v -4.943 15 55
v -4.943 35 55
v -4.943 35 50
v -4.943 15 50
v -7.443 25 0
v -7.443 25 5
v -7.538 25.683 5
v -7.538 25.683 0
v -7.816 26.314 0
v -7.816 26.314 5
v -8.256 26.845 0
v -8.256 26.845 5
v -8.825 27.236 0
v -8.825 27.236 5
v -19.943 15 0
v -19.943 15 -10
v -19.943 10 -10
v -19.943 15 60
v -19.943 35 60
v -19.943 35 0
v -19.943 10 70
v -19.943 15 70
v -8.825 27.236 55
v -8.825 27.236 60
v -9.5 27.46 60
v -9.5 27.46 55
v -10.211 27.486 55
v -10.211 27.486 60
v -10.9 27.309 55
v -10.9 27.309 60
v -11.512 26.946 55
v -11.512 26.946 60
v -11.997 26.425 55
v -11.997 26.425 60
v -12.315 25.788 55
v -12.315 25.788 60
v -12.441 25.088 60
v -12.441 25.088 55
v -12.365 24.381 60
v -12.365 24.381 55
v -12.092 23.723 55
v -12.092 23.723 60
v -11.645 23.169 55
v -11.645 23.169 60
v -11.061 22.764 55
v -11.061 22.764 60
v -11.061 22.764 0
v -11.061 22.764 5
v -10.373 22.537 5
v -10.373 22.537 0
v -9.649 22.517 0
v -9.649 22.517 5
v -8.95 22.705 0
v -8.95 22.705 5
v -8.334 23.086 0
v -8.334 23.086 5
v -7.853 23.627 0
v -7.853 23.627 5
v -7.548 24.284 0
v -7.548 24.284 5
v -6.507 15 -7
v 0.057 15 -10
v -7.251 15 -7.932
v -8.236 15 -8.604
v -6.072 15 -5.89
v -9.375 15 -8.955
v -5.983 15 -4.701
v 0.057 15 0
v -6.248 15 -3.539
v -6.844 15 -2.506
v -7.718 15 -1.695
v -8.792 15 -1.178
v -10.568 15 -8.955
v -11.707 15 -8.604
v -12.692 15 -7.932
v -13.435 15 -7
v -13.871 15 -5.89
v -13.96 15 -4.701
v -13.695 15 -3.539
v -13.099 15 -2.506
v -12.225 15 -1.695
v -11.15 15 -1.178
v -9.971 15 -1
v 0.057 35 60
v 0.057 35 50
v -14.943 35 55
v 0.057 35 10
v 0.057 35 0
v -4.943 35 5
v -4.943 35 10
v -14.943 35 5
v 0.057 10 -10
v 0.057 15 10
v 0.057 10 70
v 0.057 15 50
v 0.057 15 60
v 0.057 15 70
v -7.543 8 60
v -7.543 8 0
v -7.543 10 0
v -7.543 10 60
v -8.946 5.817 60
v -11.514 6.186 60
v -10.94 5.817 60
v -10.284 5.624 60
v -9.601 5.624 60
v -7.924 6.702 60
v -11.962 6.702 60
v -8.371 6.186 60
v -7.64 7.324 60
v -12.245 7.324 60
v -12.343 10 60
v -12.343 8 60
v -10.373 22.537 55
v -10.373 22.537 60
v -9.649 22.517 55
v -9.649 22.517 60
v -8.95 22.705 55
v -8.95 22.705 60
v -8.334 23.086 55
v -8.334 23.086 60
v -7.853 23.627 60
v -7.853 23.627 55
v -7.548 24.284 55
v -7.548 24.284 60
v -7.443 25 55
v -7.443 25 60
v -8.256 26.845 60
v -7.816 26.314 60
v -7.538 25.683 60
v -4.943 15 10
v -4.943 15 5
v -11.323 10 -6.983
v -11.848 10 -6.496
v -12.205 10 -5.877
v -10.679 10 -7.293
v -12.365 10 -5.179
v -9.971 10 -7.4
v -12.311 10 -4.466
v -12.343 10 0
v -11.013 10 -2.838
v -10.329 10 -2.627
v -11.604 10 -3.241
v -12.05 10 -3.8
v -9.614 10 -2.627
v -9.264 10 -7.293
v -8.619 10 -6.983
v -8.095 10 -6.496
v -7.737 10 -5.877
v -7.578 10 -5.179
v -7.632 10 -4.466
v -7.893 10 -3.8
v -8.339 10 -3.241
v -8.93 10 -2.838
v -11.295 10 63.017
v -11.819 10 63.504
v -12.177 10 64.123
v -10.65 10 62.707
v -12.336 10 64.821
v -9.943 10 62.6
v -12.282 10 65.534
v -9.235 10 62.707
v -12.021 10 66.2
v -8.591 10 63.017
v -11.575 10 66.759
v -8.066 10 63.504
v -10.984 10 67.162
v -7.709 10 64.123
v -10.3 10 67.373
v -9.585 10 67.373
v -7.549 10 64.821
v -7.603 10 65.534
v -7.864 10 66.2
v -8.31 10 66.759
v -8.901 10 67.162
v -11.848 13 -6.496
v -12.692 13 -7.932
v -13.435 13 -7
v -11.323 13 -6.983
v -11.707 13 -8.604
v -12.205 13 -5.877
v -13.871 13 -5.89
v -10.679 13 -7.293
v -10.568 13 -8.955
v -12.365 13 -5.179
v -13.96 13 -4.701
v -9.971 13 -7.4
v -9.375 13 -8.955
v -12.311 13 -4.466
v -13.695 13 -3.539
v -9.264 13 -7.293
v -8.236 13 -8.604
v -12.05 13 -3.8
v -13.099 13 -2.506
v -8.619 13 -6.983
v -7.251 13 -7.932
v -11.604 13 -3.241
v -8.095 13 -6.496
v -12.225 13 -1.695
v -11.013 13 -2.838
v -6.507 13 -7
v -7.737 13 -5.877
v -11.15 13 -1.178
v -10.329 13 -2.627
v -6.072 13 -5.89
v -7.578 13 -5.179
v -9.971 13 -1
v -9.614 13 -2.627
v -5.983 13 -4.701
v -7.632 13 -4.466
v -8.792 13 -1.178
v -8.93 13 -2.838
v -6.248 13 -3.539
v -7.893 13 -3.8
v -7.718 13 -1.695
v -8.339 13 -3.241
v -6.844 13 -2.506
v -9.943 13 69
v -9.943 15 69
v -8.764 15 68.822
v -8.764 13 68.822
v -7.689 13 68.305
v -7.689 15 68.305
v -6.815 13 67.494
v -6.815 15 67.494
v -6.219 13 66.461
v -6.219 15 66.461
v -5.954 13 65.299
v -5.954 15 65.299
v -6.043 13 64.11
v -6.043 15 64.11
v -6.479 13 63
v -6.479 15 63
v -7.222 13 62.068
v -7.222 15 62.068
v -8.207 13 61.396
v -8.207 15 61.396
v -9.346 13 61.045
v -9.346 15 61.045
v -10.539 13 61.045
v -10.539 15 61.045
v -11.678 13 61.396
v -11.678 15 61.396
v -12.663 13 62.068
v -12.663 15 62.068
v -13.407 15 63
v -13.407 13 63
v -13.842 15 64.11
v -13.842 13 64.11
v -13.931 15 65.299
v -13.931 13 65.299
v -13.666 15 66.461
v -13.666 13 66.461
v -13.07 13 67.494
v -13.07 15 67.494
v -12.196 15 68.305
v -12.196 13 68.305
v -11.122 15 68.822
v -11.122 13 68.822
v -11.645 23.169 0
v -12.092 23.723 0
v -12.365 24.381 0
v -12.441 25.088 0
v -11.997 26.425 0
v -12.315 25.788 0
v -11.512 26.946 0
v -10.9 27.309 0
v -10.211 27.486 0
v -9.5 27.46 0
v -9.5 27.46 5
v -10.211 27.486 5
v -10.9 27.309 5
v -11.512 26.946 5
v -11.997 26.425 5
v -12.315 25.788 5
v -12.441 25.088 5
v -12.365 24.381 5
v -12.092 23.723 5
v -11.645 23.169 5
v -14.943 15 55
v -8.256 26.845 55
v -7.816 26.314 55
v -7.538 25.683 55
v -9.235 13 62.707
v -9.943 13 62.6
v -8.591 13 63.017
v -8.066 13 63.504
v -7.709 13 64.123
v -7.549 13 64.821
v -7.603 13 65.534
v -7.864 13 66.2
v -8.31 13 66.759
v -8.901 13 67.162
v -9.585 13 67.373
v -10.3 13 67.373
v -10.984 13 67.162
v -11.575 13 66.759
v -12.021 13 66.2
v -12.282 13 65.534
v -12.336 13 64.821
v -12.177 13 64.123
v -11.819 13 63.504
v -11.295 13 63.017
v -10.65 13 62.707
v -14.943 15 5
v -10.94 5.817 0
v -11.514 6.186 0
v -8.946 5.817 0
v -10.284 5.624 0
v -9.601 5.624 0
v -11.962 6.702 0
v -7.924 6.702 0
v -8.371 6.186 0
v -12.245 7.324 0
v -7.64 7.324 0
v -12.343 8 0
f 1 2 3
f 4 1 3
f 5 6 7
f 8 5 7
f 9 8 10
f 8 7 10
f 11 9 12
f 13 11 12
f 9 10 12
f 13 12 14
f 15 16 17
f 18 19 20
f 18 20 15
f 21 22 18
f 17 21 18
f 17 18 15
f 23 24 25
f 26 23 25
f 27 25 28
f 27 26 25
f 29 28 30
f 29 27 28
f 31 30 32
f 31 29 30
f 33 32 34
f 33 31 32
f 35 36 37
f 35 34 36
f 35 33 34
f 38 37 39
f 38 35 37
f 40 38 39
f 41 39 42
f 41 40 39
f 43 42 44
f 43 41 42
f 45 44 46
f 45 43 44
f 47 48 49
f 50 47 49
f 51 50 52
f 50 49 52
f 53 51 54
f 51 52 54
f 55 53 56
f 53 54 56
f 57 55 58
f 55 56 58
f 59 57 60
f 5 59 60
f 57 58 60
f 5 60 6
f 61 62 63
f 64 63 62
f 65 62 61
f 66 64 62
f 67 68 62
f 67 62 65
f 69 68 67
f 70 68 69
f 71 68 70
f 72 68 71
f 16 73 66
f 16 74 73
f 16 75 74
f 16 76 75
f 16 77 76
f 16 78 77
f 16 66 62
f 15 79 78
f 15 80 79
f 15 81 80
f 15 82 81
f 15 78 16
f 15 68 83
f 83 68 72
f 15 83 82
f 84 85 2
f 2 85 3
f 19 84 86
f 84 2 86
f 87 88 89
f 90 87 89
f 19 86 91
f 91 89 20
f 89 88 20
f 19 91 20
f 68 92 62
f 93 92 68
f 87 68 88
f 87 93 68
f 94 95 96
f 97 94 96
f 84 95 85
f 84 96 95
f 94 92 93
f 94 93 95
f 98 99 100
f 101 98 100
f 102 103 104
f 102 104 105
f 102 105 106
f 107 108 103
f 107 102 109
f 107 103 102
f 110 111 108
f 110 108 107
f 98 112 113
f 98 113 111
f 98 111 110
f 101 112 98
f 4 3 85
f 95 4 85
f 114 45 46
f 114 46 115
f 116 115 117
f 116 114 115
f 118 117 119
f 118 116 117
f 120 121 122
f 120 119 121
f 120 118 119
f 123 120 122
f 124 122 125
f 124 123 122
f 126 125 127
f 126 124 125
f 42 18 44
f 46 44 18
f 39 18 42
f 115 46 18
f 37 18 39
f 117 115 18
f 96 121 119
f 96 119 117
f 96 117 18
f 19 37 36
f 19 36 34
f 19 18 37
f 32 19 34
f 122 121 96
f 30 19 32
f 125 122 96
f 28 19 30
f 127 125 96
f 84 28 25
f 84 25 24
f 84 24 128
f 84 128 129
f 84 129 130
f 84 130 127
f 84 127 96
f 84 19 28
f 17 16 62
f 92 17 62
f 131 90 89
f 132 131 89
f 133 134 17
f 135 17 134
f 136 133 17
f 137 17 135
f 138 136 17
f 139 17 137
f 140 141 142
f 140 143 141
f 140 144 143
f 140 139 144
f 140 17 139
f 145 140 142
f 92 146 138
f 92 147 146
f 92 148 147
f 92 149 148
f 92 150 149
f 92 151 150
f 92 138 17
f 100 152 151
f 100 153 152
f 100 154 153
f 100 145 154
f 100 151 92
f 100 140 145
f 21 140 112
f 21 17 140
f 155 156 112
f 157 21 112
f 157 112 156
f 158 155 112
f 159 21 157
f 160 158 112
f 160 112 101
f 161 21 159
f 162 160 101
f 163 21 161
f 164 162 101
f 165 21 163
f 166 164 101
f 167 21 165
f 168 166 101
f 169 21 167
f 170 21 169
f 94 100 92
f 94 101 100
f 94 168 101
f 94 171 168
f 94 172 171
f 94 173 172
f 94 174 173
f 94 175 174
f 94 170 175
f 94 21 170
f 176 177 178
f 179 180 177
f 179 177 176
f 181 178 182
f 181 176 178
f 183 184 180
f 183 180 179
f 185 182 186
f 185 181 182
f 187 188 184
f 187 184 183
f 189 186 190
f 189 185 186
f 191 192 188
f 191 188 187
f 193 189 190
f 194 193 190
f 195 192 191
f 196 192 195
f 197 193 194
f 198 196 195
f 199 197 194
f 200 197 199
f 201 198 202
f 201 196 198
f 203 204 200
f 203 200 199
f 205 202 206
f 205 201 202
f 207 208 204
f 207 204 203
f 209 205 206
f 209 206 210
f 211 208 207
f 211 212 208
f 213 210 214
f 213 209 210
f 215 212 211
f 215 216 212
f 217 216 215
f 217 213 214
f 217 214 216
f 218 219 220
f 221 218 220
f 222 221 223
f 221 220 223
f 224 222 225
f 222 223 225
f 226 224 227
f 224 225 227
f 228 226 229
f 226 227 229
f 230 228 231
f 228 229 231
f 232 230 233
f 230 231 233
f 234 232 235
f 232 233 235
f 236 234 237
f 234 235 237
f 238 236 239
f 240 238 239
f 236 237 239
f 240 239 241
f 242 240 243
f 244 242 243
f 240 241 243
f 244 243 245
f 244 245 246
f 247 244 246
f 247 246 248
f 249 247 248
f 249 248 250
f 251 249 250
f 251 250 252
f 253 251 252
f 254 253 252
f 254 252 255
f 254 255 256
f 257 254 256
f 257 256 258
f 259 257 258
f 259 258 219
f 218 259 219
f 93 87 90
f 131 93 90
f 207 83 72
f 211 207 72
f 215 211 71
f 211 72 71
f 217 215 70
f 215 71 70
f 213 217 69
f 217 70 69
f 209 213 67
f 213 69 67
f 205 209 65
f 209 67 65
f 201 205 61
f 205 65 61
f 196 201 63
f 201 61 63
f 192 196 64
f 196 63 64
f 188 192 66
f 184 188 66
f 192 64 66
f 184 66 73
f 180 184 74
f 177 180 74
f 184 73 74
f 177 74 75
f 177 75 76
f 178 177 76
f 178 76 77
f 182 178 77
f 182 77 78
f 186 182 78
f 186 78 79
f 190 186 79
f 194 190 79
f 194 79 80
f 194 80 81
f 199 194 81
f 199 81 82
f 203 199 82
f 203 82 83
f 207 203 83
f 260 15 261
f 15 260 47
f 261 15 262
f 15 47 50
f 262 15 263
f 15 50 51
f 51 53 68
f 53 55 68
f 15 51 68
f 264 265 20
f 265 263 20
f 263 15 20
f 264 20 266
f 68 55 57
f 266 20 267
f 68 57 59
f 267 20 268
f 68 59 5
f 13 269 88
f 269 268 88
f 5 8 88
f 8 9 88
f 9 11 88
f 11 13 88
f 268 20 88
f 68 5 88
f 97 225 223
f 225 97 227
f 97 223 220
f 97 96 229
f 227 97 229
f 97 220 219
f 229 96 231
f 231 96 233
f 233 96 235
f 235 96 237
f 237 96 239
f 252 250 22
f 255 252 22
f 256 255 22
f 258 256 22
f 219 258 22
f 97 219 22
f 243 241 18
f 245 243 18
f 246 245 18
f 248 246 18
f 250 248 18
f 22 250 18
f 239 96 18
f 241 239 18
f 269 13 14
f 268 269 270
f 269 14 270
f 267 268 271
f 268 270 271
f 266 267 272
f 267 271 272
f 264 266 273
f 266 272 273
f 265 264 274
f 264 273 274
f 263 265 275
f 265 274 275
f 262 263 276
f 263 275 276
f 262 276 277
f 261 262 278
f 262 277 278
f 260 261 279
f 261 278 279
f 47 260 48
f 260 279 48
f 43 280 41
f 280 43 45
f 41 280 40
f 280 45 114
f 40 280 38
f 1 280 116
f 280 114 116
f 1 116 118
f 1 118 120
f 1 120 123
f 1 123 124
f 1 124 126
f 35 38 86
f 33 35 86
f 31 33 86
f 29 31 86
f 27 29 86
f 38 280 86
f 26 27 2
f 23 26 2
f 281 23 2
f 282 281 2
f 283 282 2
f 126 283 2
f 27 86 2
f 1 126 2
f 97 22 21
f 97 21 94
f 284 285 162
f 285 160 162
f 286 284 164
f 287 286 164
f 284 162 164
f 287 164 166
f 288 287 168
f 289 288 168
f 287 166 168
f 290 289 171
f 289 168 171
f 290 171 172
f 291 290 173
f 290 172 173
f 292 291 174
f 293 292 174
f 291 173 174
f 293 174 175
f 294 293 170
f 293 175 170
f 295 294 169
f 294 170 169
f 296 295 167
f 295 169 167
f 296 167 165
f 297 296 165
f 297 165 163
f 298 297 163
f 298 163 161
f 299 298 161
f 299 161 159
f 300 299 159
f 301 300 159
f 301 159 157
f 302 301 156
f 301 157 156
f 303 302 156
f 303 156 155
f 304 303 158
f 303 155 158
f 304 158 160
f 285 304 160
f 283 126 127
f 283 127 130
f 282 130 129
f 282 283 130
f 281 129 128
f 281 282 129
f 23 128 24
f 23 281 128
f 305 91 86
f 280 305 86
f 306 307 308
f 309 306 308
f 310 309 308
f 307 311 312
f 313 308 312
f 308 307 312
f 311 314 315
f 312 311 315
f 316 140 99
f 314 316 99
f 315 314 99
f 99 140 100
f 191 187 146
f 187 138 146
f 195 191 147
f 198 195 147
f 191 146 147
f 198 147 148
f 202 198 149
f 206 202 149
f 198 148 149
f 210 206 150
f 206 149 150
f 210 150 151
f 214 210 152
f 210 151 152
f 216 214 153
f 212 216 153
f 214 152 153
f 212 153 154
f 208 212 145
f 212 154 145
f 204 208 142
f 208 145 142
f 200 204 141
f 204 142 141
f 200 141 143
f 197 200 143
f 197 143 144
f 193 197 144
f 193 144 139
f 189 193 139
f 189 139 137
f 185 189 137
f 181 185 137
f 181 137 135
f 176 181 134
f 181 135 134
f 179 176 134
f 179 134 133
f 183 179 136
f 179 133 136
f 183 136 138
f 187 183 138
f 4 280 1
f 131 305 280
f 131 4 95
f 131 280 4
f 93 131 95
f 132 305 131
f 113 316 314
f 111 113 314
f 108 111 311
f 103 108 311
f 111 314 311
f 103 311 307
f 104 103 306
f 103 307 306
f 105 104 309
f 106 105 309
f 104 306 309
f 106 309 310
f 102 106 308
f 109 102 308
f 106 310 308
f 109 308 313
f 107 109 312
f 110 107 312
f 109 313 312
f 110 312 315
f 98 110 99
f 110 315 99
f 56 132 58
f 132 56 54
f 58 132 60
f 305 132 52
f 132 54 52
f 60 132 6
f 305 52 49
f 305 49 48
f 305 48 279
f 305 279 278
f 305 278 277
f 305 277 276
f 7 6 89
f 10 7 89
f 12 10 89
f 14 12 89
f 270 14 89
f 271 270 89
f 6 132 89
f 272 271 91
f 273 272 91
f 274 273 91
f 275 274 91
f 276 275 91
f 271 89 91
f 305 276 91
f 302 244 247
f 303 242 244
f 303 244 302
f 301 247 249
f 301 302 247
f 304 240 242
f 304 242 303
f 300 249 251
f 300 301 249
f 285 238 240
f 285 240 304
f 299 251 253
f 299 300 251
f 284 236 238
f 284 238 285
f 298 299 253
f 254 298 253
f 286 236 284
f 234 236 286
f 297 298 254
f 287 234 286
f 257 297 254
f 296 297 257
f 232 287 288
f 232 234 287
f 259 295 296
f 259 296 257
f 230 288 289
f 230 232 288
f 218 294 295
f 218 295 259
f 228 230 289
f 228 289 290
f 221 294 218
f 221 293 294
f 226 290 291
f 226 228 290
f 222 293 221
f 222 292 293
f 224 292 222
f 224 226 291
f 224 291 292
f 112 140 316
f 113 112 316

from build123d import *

# Parameters (mm, degrees)
BOSS_EXTRU_1_DEPTH                                = 60
ENL_V_MAT_EXTRU_1_DEPTH                           = 20
ENL_V_MAT_EXTRU_2_DEPTH                           = 56
ENL_V_MAT_EXTRU_2_DEPTH_BACK                      = 6
BOSS_EXTRU_2_DEPTH                                = 10
CHAMBRAGE_POUR_VIS_SIX_PANS_CREUX_M41_D           = 4.8
CHAMBRAGE_POUR_VIS_SIX_PANS_CREUX_M41_CBORE_D     = 8
CHAMBRAGE_POUR_VIS_SIX_PANS_CREUX_M41_CBORE_DEPTH = 2


with BuildPart() as part:
    # Esquisse1 → Boss.-Extru.1 (new body)
    with BuildSketch(Plane.XY):
        with BuildLine():
            Line((-19.942668722, 35), (-19.942668722, 10))
            Line((-19.942668722, 10), (-12.342668722, 10))
            Line((-12.342668722, 10), (-12.342668722, 8))
            ThreePointArc((-12.342668722, 8), (-9.942668722, 5.6), (-7.542668722, 8))
            Line((-7.542668722, 8), (-7.542668722, 10))
            Line((-7.542668722, 10), (0.057331278, 10))
            Line((0.057331278, 10), (0.057331278, 35))
            Line((0.057331278, 35), (-19.942668722, 35))
        make_face()
    extrude(amount=BOSS_EXTRU_1_DEPTH)

    # Esquisse2 → Enlèv. mat.-Extru.1 (cut)
    with BuildSketch(Plane(origin=(0, 35, 0), x_dir=(1, 0, 0), z_dir=(0, 1, 0))):
        Polygon((0.057331278, -50), (0.057331278, -10), (-4.942668722, -10), (-4.942668722, -5), (-14.942668722, -5), (-14.942668722, -55), (-4.942668722, -55), (-4.942668722, -50), align=None)
    extrude(amount=-ENL_V_MAT_EXTRU_1_DEPTH, mode=Mode.SUBTRACT)

    # Esquisse3 → Enlèv. mat.-Extru.2 (cut, two sides)
    with BuildSketch(Plane.XY.offset(5)) as enl_v_mat_extru_2_sk:
        with BuildLine():
            ThreePointArc((-8.824634733, 27.236067977), (-12.178736699, 26.118033989), (-11.06070271, 22.763932023))
            Line((-11.06070271, 22.763932023), (-8.824634733, 27.236067977))
        make_face()
        with BuildLine():
            Line((-8.824634733, 27.236067977), (-11.06070271, 22.763932023))
            ThreePointArc((-11.06070271, 22.763932023), (-8.628340941, 22.873372979), (-7.442668722, 25))
            ThreePointArc((-7.442668722, 25), (-7.816041701, 26.31432778), (-8.824634733, 27.236067977))
        make_face()
    extrude(amount=ENL_V_MAT_EXTRU_2_DEPTH, mode=Mode.SUBTRACT)
    extrude(enl_v_mat_extru_2_sk.sketch, amount=-ENL_V_MAT_EXTRU_2_DEPTH_BACK, mode=Mode.SUBTRACT)

    # Esquisse4 → Boss.-Extru.2 (add)
    with BuildSketch(Plane.XY.offset(60)):
        Polygon((-19.942668722, 15), (-19.942668722, 10), (-12.342668722, 10), (-7.542668722, 10), (0.057331278, 10), (0.057331278, 15), align=None)
    boss_extru_2 = extrude(amount=BOSS_EXTRU_2_DEPTH)

    # Symétrie1: Boss.-Extru.2 across plane
    add(boss_extru_2.mirror(Plane.XY.offset(30)))

    # Chambrage pour vis à six pans creux M41 (through all)
    with Locations(Plane(origin=(-9.971334361, 15, -5), x_dir=(0, 0, 1), z_dir=(0, 1, 0))):
        with Locations((0, 0), (70, 0.028665639)):
            CounterBoreHole(CHAMBRAGE_POUR_VIS_SIX_PANS_CREUX_M41_D / 2, CHAMBRAGE_POUR_VIS_SIX_PANS_CREUX_M41_CBORE_D / 2, CHAMBRAGE_POUR_VIS_SIX_PANS_CREUX_M41_CBORE_DEPTH)


solid = part.part
